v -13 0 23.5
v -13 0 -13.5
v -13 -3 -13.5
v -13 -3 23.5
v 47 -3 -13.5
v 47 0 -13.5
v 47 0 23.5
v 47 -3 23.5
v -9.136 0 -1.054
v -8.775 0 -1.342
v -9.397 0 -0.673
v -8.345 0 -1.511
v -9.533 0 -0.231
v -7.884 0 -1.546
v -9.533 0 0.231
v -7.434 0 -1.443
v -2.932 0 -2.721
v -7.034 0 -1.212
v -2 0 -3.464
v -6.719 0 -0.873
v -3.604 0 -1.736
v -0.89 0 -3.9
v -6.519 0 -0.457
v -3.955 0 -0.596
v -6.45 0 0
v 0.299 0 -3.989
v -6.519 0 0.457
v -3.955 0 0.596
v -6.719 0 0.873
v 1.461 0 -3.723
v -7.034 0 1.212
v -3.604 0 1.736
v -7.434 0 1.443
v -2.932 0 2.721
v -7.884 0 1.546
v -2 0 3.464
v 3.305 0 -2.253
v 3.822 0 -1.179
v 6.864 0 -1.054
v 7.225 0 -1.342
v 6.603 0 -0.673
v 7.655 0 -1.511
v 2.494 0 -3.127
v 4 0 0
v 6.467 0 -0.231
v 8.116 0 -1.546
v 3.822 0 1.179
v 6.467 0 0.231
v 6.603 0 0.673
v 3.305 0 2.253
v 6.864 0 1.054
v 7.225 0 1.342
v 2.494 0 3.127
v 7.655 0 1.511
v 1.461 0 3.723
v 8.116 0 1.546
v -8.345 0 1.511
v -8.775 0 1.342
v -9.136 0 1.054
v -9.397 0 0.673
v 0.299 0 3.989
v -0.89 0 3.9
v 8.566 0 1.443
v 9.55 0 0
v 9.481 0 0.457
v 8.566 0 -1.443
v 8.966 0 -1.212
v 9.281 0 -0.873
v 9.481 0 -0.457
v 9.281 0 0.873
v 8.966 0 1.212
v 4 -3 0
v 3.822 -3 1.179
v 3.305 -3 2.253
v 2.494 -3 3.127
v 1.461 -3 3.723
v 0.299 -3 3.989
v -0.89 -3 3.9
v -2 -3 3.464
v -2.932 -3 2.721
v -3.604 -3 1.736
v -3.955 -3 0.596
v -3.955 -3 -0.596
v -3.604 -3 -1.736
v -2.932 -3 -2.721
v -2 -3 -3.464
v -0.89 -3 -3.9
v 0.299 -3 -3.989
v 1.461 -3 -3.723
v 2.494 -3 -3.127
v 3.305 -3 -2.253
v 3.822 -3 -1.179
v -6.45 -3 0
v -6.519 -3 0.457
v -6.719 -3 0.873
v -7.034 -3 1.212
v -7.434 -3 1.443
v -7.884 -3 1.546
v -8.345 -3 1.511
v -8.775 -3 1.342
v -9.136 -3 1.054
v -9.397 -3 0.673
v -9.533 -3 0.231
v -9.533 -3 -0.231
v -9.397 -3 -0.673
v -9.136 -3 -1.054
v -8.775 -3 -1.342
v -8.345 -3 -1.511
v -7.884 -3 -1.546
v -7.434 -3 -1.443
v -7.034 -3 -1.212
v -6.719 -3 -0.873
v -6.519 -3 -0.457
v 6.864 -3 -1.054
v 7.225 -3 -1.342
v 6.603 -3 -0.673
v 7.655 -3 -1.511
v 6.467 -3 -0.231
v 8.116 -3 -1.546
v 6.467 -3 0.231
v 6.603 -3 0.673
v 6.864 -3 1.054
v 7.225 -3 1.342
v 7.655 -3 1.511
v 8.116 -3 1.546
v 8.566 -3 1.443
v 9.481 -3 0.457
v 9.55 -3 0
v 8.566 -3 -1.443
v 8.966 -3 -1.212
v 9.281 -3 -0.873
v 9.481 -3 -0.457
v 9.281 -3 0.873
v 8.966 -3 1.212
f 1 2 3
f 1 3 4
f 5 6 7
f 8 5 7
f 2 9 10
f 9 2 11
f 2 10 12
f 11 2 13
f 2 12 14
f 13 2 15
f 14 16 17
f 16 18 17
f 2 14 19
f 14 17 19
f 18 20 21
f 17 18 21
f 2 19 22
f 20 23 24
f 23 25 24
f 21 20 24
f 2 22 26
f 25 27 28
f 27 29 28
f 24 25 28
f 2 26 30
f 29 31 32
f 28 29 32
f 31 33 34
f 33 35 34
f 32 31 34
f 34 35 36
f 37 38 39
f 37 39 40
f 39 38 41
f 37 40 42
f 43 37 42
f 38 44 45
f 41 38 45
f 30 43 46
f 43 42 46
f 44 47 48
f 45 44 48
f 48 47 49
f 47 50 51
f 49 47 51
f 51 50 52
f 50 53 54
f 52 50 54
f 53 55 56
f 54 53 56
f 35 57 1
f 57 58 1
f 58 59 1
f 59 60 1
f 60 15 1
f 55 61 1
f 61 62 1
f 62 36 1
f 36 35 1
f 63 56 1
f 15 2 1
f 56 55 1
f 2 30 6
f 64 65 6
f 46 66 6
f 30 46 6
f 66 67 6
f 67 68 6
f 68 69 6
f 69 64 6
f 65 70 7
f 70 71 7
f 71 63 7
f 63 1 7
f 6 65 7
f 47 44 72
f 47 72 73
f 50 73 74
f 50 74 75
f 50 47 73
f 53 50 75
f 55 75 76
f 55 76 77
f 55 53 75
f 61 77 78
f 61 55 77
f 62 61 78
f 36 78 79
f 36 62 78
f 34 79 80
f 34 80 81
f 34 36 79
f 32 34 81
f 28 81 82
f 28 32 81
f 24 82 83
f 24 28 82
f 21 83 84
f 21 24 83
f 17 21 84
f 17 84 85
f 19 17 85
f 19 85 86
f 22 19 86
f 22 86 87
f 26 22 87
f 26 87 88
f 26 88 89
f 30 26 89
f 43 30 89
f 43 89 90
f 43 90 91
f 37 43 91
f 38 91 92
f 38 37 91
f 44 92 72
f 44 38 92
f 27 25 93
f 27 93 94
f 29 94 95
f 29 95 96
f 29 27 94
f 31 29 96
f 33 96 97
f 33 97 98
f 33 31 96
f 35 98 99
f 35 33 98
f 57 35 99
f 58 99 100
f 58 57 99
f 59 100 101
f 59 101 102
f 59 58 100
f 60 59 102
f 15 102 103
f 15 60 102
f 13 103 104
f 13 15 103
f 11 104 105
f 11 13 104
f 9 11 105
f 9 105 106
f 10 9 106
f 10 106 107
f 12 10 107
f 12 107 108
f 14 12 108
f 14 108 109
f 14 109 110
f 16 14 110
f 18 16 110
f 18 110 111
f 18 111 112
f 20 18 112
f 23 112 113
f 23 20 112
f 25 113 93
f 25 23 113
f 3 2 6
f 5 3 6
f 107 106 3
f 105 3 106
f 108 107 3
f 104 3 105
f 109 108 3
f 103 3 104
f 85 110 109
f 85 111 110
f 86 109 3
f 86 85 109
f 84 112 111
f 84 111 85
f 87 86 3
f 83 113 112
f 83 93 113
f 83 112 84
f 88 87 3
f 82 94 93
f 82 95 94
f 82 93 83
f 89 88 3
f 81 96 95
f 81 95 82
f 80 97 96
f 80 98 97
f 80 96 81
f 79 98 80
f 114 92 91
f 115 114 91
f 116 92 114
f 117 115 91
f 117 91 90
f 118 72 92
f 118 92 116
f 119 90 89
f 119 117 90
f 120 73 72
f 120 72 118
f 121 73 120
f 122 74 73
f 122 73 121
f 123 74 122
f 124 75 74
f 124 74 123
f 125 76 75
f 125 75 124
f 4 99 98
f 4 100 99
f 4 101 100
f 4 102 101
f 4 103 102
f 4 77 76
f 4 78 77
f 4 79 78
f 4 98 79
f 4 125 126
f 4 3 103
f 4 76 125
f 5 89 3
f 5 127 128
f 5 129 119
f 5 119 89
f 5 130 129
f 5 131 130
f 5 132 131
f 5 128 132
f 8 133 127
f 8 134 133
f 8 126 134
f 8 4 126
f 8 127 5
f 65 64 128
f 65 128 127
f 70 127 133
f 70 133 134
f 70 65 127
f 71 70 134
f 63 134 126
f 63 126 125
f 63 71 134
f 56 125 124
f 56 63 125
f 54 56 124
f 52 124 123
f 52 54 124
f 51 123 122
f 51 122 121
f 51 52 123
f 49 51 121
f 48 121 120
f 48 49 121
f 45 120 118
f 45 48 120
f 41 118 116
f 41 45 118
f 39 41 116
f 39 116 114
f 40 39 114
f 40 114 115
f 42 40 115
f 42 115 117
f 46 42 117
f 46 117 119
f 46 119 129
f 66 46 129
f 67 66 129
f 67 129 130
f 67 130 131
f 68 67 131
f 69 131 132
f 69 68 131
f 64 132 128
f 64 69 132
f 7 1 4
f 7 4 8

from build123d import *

# Parameters (mm, degrees)
F0_W     = 60
F0_H     = 37
F0_R     = 1.55
F0_R_2   = 4
F1_DEPTH = 3


with BuildPart() as f1:
    # F0 (on Front) → F1 (new body)
    with BuildSketch(Plane.XZ):
        with Locations((17, 5)):
            Rectangle(F0_W, F0_H)
        with Locations((-8, 0)):
            Circle(F0_R, mode=Mode.SUBTRACT)
        Circle(F0_R_2, mode=Mode.SUBTRACT)
        with Locations((8, 0)):
            Circle(F0_R, mode=Mode.SUBTRACT)
    extrude(amount=F1_DEPTH)


solid = f1.part
